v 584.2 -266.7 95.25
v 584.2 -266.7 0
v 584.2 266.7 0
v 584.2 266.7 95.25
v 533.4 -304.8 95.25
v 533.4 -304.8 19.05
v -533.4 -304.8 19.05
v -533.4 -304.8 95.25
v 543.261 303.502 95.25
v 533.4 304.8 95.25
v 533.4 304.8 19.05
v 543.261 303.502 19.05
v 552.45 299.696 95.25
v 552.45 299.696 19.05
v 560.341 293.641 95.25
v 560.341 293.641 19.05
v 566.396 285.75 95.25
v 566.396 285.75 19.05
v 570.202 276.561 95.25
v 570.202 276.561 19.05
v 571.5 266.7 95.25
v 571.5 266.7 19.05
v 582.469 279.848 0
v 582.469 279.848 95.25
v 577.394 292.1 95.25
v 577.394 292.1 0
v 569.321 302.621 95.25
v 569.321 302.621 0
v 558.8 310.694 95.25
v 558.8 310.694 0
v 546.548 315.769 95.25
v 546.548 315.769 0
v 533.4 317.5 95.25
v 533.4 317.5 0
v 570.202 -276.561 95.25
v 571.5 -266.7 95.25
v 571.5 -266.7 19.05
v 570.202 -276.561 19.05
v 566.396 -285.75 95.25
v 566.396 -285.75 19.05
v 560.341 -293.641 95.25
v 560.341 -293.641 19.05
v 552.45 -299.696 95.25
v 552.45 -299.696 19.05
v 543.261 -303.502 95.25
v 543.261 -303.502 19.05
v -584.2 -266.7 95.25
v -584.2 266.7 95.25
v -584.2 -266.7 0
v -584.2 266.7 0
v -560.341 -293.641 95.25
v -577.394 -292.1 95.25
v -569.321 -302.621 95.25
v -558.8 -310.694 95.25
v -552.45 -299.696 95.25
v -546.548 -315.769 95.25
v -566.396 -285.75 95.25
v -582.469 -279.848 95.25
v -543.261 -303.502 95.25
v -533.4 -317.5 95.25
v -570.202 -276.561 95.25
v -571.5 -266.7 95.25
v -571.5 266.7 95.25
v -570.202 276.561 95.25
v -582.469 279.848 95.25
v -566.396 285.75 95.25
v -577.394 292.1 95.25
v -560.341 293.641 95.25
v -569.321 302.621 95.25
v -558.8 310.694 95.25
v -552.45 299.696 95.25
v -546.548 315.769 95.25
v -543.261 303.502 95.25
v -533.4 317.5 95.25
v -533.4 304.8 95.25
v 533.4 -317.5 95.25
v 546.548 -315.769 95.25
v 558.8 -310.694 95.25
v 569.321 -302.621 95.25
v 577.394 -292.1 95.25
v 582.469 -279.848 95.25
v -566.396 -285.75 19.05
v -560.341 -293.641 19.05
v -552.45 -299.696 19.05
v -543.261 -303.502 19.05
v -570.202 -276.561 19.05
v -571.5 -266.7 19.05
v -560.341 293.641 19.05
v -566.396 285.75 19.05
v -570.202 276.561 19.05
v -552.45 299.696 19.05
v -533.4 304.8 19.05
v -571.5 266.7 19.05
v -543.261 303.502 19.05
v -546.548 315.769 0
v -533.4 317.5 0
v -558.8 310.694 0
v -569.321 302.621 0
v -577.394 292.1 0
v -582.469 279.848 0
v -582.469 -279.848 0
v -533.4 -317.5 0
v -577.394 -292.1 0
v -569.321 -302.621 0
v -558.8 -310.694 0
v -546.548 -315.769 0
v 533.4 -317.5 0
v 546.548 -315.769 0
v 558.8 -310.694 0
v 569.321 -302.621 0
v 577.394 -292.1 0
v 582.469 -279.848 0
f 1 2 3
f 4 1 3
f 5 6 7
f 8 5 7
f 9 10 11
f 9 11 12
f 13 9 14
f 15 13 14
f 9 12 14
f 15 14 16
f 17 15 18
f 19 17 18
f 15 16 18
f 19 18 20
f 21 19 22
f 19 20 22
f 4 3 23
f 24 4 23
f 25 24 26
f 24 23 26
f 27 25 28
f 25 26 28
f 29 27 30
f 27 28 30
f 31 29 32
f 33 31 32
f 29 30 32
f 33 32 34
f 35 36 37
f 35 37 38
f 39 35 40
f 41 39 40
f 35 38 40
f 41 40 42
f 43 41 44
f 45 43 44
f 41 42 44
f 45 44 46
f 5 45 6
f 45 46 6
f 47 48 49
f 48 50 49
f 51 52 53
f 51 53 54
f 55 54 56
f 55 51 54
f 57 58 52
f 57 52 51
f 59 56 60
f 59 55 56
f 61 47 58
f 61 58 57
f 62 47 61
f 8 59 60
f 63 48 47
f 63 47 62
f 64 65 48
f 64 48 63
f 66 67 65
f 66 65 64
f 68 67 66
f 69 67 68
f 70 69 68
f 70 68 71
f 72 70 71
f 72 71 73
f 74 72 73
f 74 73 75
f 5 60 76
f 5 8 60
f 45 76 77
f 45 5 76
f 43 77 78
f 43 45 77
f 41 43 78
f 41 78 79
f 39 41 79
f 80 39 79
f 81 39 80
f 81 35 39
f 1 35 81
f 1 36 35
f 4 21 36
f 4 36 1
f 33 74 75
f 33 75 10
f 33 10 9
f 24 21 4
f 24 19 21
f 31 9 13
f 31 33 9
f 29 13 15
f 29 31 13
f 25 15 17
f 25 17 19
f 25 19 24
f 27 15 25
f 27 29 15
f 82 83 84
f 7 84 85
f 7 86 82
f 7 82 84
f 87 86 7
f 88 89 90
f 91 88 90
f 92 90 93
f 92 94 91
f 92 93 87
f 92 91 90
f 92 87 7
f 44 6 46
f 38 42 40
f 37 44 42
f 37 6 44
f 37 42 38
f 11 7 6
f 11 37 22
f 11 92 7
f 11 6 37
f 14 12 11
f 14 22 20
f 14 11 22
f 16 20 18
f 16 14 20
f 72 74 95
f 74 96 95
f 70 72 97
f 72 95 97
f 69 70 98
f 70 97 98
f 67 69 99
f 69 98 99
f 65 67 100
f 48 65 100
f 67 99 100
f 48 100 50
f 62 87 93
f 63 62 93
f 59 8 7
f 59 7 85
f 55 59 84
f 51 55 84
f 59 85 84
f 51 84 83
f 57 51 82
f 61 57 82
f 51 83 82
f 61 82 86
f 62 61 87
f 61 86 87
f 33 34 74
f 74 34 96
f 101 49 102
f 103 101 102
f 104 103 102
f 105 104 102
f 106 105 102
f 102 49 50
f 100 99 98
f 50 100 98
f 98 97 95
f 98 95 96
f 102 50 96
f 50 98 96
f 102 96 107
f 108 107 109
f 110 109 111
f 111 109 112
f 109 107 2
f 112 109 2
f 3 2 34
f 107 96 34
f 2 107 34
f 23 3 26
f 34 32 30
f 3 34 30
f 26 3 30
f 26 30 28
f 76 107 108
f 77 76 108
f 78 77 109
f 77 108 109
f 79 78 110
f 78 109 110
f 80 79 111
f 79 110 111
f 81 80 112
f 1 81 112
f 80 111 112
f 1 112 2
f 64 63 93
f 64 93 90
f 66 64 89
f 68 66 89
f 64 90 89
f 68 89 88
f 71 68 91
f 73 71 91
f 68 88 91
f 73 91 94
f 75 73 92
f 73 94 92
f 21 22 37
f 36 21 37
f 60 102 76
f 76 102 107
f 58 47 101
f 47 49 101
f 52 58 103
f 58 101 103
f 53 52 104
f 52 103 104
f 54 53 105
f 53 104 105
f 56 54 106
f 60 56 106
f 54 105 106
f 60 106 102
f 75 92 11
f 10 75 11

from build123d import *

# Parameters (mm, degrees)
F1_DEPTH = 19.05
F3_DEPTH = 76.2


# Not quite as in the source:
# - a feature names something its author has since deleted; it is built from what else it names


with BuildPart() as f1:
    # F0 (on Top) → F1 (new body)
    with BuildSketch(Plane.XY):
        with BuildLine():
            Line((533.4, 317.5), (-533.4, 317.5))
            ThreePointArc((-533.4, 317.5), (-569.3210244843, 302.6210244843), (-584.2, 266.7))
            Line((-584.2, 266.7), (-584.2, -266.7))
            ThreePointArc((-584.2, -266.7), (-569.3210244843, -302.6210244843), (-533.4, -317.5))
            Line((-533.4, -317.5), (533.4, -317.5))
            ThreePointArc((533.4, -317.5), (569.3210244843, -302.6210244843), (584.2, -266.7))
            Line((584.2, -266.7), (584.2, 266.7))
            ThreePointArc((584.2, 266.7), (569.3210244843, 302.6210244843), (533.4, 317.5))
        make_face()
    extrude(amount=F1_DEPTH)

    # F2 (on face) → F3 (join)
    with BuildSketch(Plane.XY.offset(19.05)):
        with BuildLine():
            ThreePointArc((584.2, 266.7), (569.3210244843, 302.6210244843), (533.4, 317.5))
            Line((533.4, 317.5), (-533.4, 317.5))
            ThreePointArc((-533.4, 317.5), (-569.3210244843, 302.6210244843), (-584.2, 266.7))
            Line((-584.2, 266.7), (-584.2, -266.7))
            ThreePointArc((-584.2, -266.7), (-569.3210244843, -302.6210244843), (-533.4, -317.5))
            Line((-533.4, -317.5), (533.4, -317.5))
            ThreePointArc((533.4, -317.5), (569.3210244843, -302.6210244843), (584.2, -266.7))
            Line((584.2, -266.7), (584.2, 266.7))
        make_face()
        with BuildLine():
            Line((-571.5, -266.7), (-571.5, 266.7))
            ThreePointArc((-571.5, 266.7), (-560.3407683632, 293.6407683632), (-533.4, 304.8))
            Line((-533.4, 304.8), (533.4, 304.8))
            ThreePointArc((533.4, 304.8), (560.3407683632, 293.6407683632), (571.5, 266.7))
            Line((571.5, 266.7), (571.5, -266.7))
            ThreePointArc((571.5, -266.7), (560.3407683632, -293.6407683632), (533.4, -304.8))
            Line((533.4, -304.8), (-533.4, -304.8))
            ThreePointArc((-533.4, -304.8), (-560.3407683632, -293.6407683632), (-571.5, -266.7))
        make_face(mode=Mode.SUBTRACT)
    extrude(amount=F3_DEPTH)


solid = f1.part
